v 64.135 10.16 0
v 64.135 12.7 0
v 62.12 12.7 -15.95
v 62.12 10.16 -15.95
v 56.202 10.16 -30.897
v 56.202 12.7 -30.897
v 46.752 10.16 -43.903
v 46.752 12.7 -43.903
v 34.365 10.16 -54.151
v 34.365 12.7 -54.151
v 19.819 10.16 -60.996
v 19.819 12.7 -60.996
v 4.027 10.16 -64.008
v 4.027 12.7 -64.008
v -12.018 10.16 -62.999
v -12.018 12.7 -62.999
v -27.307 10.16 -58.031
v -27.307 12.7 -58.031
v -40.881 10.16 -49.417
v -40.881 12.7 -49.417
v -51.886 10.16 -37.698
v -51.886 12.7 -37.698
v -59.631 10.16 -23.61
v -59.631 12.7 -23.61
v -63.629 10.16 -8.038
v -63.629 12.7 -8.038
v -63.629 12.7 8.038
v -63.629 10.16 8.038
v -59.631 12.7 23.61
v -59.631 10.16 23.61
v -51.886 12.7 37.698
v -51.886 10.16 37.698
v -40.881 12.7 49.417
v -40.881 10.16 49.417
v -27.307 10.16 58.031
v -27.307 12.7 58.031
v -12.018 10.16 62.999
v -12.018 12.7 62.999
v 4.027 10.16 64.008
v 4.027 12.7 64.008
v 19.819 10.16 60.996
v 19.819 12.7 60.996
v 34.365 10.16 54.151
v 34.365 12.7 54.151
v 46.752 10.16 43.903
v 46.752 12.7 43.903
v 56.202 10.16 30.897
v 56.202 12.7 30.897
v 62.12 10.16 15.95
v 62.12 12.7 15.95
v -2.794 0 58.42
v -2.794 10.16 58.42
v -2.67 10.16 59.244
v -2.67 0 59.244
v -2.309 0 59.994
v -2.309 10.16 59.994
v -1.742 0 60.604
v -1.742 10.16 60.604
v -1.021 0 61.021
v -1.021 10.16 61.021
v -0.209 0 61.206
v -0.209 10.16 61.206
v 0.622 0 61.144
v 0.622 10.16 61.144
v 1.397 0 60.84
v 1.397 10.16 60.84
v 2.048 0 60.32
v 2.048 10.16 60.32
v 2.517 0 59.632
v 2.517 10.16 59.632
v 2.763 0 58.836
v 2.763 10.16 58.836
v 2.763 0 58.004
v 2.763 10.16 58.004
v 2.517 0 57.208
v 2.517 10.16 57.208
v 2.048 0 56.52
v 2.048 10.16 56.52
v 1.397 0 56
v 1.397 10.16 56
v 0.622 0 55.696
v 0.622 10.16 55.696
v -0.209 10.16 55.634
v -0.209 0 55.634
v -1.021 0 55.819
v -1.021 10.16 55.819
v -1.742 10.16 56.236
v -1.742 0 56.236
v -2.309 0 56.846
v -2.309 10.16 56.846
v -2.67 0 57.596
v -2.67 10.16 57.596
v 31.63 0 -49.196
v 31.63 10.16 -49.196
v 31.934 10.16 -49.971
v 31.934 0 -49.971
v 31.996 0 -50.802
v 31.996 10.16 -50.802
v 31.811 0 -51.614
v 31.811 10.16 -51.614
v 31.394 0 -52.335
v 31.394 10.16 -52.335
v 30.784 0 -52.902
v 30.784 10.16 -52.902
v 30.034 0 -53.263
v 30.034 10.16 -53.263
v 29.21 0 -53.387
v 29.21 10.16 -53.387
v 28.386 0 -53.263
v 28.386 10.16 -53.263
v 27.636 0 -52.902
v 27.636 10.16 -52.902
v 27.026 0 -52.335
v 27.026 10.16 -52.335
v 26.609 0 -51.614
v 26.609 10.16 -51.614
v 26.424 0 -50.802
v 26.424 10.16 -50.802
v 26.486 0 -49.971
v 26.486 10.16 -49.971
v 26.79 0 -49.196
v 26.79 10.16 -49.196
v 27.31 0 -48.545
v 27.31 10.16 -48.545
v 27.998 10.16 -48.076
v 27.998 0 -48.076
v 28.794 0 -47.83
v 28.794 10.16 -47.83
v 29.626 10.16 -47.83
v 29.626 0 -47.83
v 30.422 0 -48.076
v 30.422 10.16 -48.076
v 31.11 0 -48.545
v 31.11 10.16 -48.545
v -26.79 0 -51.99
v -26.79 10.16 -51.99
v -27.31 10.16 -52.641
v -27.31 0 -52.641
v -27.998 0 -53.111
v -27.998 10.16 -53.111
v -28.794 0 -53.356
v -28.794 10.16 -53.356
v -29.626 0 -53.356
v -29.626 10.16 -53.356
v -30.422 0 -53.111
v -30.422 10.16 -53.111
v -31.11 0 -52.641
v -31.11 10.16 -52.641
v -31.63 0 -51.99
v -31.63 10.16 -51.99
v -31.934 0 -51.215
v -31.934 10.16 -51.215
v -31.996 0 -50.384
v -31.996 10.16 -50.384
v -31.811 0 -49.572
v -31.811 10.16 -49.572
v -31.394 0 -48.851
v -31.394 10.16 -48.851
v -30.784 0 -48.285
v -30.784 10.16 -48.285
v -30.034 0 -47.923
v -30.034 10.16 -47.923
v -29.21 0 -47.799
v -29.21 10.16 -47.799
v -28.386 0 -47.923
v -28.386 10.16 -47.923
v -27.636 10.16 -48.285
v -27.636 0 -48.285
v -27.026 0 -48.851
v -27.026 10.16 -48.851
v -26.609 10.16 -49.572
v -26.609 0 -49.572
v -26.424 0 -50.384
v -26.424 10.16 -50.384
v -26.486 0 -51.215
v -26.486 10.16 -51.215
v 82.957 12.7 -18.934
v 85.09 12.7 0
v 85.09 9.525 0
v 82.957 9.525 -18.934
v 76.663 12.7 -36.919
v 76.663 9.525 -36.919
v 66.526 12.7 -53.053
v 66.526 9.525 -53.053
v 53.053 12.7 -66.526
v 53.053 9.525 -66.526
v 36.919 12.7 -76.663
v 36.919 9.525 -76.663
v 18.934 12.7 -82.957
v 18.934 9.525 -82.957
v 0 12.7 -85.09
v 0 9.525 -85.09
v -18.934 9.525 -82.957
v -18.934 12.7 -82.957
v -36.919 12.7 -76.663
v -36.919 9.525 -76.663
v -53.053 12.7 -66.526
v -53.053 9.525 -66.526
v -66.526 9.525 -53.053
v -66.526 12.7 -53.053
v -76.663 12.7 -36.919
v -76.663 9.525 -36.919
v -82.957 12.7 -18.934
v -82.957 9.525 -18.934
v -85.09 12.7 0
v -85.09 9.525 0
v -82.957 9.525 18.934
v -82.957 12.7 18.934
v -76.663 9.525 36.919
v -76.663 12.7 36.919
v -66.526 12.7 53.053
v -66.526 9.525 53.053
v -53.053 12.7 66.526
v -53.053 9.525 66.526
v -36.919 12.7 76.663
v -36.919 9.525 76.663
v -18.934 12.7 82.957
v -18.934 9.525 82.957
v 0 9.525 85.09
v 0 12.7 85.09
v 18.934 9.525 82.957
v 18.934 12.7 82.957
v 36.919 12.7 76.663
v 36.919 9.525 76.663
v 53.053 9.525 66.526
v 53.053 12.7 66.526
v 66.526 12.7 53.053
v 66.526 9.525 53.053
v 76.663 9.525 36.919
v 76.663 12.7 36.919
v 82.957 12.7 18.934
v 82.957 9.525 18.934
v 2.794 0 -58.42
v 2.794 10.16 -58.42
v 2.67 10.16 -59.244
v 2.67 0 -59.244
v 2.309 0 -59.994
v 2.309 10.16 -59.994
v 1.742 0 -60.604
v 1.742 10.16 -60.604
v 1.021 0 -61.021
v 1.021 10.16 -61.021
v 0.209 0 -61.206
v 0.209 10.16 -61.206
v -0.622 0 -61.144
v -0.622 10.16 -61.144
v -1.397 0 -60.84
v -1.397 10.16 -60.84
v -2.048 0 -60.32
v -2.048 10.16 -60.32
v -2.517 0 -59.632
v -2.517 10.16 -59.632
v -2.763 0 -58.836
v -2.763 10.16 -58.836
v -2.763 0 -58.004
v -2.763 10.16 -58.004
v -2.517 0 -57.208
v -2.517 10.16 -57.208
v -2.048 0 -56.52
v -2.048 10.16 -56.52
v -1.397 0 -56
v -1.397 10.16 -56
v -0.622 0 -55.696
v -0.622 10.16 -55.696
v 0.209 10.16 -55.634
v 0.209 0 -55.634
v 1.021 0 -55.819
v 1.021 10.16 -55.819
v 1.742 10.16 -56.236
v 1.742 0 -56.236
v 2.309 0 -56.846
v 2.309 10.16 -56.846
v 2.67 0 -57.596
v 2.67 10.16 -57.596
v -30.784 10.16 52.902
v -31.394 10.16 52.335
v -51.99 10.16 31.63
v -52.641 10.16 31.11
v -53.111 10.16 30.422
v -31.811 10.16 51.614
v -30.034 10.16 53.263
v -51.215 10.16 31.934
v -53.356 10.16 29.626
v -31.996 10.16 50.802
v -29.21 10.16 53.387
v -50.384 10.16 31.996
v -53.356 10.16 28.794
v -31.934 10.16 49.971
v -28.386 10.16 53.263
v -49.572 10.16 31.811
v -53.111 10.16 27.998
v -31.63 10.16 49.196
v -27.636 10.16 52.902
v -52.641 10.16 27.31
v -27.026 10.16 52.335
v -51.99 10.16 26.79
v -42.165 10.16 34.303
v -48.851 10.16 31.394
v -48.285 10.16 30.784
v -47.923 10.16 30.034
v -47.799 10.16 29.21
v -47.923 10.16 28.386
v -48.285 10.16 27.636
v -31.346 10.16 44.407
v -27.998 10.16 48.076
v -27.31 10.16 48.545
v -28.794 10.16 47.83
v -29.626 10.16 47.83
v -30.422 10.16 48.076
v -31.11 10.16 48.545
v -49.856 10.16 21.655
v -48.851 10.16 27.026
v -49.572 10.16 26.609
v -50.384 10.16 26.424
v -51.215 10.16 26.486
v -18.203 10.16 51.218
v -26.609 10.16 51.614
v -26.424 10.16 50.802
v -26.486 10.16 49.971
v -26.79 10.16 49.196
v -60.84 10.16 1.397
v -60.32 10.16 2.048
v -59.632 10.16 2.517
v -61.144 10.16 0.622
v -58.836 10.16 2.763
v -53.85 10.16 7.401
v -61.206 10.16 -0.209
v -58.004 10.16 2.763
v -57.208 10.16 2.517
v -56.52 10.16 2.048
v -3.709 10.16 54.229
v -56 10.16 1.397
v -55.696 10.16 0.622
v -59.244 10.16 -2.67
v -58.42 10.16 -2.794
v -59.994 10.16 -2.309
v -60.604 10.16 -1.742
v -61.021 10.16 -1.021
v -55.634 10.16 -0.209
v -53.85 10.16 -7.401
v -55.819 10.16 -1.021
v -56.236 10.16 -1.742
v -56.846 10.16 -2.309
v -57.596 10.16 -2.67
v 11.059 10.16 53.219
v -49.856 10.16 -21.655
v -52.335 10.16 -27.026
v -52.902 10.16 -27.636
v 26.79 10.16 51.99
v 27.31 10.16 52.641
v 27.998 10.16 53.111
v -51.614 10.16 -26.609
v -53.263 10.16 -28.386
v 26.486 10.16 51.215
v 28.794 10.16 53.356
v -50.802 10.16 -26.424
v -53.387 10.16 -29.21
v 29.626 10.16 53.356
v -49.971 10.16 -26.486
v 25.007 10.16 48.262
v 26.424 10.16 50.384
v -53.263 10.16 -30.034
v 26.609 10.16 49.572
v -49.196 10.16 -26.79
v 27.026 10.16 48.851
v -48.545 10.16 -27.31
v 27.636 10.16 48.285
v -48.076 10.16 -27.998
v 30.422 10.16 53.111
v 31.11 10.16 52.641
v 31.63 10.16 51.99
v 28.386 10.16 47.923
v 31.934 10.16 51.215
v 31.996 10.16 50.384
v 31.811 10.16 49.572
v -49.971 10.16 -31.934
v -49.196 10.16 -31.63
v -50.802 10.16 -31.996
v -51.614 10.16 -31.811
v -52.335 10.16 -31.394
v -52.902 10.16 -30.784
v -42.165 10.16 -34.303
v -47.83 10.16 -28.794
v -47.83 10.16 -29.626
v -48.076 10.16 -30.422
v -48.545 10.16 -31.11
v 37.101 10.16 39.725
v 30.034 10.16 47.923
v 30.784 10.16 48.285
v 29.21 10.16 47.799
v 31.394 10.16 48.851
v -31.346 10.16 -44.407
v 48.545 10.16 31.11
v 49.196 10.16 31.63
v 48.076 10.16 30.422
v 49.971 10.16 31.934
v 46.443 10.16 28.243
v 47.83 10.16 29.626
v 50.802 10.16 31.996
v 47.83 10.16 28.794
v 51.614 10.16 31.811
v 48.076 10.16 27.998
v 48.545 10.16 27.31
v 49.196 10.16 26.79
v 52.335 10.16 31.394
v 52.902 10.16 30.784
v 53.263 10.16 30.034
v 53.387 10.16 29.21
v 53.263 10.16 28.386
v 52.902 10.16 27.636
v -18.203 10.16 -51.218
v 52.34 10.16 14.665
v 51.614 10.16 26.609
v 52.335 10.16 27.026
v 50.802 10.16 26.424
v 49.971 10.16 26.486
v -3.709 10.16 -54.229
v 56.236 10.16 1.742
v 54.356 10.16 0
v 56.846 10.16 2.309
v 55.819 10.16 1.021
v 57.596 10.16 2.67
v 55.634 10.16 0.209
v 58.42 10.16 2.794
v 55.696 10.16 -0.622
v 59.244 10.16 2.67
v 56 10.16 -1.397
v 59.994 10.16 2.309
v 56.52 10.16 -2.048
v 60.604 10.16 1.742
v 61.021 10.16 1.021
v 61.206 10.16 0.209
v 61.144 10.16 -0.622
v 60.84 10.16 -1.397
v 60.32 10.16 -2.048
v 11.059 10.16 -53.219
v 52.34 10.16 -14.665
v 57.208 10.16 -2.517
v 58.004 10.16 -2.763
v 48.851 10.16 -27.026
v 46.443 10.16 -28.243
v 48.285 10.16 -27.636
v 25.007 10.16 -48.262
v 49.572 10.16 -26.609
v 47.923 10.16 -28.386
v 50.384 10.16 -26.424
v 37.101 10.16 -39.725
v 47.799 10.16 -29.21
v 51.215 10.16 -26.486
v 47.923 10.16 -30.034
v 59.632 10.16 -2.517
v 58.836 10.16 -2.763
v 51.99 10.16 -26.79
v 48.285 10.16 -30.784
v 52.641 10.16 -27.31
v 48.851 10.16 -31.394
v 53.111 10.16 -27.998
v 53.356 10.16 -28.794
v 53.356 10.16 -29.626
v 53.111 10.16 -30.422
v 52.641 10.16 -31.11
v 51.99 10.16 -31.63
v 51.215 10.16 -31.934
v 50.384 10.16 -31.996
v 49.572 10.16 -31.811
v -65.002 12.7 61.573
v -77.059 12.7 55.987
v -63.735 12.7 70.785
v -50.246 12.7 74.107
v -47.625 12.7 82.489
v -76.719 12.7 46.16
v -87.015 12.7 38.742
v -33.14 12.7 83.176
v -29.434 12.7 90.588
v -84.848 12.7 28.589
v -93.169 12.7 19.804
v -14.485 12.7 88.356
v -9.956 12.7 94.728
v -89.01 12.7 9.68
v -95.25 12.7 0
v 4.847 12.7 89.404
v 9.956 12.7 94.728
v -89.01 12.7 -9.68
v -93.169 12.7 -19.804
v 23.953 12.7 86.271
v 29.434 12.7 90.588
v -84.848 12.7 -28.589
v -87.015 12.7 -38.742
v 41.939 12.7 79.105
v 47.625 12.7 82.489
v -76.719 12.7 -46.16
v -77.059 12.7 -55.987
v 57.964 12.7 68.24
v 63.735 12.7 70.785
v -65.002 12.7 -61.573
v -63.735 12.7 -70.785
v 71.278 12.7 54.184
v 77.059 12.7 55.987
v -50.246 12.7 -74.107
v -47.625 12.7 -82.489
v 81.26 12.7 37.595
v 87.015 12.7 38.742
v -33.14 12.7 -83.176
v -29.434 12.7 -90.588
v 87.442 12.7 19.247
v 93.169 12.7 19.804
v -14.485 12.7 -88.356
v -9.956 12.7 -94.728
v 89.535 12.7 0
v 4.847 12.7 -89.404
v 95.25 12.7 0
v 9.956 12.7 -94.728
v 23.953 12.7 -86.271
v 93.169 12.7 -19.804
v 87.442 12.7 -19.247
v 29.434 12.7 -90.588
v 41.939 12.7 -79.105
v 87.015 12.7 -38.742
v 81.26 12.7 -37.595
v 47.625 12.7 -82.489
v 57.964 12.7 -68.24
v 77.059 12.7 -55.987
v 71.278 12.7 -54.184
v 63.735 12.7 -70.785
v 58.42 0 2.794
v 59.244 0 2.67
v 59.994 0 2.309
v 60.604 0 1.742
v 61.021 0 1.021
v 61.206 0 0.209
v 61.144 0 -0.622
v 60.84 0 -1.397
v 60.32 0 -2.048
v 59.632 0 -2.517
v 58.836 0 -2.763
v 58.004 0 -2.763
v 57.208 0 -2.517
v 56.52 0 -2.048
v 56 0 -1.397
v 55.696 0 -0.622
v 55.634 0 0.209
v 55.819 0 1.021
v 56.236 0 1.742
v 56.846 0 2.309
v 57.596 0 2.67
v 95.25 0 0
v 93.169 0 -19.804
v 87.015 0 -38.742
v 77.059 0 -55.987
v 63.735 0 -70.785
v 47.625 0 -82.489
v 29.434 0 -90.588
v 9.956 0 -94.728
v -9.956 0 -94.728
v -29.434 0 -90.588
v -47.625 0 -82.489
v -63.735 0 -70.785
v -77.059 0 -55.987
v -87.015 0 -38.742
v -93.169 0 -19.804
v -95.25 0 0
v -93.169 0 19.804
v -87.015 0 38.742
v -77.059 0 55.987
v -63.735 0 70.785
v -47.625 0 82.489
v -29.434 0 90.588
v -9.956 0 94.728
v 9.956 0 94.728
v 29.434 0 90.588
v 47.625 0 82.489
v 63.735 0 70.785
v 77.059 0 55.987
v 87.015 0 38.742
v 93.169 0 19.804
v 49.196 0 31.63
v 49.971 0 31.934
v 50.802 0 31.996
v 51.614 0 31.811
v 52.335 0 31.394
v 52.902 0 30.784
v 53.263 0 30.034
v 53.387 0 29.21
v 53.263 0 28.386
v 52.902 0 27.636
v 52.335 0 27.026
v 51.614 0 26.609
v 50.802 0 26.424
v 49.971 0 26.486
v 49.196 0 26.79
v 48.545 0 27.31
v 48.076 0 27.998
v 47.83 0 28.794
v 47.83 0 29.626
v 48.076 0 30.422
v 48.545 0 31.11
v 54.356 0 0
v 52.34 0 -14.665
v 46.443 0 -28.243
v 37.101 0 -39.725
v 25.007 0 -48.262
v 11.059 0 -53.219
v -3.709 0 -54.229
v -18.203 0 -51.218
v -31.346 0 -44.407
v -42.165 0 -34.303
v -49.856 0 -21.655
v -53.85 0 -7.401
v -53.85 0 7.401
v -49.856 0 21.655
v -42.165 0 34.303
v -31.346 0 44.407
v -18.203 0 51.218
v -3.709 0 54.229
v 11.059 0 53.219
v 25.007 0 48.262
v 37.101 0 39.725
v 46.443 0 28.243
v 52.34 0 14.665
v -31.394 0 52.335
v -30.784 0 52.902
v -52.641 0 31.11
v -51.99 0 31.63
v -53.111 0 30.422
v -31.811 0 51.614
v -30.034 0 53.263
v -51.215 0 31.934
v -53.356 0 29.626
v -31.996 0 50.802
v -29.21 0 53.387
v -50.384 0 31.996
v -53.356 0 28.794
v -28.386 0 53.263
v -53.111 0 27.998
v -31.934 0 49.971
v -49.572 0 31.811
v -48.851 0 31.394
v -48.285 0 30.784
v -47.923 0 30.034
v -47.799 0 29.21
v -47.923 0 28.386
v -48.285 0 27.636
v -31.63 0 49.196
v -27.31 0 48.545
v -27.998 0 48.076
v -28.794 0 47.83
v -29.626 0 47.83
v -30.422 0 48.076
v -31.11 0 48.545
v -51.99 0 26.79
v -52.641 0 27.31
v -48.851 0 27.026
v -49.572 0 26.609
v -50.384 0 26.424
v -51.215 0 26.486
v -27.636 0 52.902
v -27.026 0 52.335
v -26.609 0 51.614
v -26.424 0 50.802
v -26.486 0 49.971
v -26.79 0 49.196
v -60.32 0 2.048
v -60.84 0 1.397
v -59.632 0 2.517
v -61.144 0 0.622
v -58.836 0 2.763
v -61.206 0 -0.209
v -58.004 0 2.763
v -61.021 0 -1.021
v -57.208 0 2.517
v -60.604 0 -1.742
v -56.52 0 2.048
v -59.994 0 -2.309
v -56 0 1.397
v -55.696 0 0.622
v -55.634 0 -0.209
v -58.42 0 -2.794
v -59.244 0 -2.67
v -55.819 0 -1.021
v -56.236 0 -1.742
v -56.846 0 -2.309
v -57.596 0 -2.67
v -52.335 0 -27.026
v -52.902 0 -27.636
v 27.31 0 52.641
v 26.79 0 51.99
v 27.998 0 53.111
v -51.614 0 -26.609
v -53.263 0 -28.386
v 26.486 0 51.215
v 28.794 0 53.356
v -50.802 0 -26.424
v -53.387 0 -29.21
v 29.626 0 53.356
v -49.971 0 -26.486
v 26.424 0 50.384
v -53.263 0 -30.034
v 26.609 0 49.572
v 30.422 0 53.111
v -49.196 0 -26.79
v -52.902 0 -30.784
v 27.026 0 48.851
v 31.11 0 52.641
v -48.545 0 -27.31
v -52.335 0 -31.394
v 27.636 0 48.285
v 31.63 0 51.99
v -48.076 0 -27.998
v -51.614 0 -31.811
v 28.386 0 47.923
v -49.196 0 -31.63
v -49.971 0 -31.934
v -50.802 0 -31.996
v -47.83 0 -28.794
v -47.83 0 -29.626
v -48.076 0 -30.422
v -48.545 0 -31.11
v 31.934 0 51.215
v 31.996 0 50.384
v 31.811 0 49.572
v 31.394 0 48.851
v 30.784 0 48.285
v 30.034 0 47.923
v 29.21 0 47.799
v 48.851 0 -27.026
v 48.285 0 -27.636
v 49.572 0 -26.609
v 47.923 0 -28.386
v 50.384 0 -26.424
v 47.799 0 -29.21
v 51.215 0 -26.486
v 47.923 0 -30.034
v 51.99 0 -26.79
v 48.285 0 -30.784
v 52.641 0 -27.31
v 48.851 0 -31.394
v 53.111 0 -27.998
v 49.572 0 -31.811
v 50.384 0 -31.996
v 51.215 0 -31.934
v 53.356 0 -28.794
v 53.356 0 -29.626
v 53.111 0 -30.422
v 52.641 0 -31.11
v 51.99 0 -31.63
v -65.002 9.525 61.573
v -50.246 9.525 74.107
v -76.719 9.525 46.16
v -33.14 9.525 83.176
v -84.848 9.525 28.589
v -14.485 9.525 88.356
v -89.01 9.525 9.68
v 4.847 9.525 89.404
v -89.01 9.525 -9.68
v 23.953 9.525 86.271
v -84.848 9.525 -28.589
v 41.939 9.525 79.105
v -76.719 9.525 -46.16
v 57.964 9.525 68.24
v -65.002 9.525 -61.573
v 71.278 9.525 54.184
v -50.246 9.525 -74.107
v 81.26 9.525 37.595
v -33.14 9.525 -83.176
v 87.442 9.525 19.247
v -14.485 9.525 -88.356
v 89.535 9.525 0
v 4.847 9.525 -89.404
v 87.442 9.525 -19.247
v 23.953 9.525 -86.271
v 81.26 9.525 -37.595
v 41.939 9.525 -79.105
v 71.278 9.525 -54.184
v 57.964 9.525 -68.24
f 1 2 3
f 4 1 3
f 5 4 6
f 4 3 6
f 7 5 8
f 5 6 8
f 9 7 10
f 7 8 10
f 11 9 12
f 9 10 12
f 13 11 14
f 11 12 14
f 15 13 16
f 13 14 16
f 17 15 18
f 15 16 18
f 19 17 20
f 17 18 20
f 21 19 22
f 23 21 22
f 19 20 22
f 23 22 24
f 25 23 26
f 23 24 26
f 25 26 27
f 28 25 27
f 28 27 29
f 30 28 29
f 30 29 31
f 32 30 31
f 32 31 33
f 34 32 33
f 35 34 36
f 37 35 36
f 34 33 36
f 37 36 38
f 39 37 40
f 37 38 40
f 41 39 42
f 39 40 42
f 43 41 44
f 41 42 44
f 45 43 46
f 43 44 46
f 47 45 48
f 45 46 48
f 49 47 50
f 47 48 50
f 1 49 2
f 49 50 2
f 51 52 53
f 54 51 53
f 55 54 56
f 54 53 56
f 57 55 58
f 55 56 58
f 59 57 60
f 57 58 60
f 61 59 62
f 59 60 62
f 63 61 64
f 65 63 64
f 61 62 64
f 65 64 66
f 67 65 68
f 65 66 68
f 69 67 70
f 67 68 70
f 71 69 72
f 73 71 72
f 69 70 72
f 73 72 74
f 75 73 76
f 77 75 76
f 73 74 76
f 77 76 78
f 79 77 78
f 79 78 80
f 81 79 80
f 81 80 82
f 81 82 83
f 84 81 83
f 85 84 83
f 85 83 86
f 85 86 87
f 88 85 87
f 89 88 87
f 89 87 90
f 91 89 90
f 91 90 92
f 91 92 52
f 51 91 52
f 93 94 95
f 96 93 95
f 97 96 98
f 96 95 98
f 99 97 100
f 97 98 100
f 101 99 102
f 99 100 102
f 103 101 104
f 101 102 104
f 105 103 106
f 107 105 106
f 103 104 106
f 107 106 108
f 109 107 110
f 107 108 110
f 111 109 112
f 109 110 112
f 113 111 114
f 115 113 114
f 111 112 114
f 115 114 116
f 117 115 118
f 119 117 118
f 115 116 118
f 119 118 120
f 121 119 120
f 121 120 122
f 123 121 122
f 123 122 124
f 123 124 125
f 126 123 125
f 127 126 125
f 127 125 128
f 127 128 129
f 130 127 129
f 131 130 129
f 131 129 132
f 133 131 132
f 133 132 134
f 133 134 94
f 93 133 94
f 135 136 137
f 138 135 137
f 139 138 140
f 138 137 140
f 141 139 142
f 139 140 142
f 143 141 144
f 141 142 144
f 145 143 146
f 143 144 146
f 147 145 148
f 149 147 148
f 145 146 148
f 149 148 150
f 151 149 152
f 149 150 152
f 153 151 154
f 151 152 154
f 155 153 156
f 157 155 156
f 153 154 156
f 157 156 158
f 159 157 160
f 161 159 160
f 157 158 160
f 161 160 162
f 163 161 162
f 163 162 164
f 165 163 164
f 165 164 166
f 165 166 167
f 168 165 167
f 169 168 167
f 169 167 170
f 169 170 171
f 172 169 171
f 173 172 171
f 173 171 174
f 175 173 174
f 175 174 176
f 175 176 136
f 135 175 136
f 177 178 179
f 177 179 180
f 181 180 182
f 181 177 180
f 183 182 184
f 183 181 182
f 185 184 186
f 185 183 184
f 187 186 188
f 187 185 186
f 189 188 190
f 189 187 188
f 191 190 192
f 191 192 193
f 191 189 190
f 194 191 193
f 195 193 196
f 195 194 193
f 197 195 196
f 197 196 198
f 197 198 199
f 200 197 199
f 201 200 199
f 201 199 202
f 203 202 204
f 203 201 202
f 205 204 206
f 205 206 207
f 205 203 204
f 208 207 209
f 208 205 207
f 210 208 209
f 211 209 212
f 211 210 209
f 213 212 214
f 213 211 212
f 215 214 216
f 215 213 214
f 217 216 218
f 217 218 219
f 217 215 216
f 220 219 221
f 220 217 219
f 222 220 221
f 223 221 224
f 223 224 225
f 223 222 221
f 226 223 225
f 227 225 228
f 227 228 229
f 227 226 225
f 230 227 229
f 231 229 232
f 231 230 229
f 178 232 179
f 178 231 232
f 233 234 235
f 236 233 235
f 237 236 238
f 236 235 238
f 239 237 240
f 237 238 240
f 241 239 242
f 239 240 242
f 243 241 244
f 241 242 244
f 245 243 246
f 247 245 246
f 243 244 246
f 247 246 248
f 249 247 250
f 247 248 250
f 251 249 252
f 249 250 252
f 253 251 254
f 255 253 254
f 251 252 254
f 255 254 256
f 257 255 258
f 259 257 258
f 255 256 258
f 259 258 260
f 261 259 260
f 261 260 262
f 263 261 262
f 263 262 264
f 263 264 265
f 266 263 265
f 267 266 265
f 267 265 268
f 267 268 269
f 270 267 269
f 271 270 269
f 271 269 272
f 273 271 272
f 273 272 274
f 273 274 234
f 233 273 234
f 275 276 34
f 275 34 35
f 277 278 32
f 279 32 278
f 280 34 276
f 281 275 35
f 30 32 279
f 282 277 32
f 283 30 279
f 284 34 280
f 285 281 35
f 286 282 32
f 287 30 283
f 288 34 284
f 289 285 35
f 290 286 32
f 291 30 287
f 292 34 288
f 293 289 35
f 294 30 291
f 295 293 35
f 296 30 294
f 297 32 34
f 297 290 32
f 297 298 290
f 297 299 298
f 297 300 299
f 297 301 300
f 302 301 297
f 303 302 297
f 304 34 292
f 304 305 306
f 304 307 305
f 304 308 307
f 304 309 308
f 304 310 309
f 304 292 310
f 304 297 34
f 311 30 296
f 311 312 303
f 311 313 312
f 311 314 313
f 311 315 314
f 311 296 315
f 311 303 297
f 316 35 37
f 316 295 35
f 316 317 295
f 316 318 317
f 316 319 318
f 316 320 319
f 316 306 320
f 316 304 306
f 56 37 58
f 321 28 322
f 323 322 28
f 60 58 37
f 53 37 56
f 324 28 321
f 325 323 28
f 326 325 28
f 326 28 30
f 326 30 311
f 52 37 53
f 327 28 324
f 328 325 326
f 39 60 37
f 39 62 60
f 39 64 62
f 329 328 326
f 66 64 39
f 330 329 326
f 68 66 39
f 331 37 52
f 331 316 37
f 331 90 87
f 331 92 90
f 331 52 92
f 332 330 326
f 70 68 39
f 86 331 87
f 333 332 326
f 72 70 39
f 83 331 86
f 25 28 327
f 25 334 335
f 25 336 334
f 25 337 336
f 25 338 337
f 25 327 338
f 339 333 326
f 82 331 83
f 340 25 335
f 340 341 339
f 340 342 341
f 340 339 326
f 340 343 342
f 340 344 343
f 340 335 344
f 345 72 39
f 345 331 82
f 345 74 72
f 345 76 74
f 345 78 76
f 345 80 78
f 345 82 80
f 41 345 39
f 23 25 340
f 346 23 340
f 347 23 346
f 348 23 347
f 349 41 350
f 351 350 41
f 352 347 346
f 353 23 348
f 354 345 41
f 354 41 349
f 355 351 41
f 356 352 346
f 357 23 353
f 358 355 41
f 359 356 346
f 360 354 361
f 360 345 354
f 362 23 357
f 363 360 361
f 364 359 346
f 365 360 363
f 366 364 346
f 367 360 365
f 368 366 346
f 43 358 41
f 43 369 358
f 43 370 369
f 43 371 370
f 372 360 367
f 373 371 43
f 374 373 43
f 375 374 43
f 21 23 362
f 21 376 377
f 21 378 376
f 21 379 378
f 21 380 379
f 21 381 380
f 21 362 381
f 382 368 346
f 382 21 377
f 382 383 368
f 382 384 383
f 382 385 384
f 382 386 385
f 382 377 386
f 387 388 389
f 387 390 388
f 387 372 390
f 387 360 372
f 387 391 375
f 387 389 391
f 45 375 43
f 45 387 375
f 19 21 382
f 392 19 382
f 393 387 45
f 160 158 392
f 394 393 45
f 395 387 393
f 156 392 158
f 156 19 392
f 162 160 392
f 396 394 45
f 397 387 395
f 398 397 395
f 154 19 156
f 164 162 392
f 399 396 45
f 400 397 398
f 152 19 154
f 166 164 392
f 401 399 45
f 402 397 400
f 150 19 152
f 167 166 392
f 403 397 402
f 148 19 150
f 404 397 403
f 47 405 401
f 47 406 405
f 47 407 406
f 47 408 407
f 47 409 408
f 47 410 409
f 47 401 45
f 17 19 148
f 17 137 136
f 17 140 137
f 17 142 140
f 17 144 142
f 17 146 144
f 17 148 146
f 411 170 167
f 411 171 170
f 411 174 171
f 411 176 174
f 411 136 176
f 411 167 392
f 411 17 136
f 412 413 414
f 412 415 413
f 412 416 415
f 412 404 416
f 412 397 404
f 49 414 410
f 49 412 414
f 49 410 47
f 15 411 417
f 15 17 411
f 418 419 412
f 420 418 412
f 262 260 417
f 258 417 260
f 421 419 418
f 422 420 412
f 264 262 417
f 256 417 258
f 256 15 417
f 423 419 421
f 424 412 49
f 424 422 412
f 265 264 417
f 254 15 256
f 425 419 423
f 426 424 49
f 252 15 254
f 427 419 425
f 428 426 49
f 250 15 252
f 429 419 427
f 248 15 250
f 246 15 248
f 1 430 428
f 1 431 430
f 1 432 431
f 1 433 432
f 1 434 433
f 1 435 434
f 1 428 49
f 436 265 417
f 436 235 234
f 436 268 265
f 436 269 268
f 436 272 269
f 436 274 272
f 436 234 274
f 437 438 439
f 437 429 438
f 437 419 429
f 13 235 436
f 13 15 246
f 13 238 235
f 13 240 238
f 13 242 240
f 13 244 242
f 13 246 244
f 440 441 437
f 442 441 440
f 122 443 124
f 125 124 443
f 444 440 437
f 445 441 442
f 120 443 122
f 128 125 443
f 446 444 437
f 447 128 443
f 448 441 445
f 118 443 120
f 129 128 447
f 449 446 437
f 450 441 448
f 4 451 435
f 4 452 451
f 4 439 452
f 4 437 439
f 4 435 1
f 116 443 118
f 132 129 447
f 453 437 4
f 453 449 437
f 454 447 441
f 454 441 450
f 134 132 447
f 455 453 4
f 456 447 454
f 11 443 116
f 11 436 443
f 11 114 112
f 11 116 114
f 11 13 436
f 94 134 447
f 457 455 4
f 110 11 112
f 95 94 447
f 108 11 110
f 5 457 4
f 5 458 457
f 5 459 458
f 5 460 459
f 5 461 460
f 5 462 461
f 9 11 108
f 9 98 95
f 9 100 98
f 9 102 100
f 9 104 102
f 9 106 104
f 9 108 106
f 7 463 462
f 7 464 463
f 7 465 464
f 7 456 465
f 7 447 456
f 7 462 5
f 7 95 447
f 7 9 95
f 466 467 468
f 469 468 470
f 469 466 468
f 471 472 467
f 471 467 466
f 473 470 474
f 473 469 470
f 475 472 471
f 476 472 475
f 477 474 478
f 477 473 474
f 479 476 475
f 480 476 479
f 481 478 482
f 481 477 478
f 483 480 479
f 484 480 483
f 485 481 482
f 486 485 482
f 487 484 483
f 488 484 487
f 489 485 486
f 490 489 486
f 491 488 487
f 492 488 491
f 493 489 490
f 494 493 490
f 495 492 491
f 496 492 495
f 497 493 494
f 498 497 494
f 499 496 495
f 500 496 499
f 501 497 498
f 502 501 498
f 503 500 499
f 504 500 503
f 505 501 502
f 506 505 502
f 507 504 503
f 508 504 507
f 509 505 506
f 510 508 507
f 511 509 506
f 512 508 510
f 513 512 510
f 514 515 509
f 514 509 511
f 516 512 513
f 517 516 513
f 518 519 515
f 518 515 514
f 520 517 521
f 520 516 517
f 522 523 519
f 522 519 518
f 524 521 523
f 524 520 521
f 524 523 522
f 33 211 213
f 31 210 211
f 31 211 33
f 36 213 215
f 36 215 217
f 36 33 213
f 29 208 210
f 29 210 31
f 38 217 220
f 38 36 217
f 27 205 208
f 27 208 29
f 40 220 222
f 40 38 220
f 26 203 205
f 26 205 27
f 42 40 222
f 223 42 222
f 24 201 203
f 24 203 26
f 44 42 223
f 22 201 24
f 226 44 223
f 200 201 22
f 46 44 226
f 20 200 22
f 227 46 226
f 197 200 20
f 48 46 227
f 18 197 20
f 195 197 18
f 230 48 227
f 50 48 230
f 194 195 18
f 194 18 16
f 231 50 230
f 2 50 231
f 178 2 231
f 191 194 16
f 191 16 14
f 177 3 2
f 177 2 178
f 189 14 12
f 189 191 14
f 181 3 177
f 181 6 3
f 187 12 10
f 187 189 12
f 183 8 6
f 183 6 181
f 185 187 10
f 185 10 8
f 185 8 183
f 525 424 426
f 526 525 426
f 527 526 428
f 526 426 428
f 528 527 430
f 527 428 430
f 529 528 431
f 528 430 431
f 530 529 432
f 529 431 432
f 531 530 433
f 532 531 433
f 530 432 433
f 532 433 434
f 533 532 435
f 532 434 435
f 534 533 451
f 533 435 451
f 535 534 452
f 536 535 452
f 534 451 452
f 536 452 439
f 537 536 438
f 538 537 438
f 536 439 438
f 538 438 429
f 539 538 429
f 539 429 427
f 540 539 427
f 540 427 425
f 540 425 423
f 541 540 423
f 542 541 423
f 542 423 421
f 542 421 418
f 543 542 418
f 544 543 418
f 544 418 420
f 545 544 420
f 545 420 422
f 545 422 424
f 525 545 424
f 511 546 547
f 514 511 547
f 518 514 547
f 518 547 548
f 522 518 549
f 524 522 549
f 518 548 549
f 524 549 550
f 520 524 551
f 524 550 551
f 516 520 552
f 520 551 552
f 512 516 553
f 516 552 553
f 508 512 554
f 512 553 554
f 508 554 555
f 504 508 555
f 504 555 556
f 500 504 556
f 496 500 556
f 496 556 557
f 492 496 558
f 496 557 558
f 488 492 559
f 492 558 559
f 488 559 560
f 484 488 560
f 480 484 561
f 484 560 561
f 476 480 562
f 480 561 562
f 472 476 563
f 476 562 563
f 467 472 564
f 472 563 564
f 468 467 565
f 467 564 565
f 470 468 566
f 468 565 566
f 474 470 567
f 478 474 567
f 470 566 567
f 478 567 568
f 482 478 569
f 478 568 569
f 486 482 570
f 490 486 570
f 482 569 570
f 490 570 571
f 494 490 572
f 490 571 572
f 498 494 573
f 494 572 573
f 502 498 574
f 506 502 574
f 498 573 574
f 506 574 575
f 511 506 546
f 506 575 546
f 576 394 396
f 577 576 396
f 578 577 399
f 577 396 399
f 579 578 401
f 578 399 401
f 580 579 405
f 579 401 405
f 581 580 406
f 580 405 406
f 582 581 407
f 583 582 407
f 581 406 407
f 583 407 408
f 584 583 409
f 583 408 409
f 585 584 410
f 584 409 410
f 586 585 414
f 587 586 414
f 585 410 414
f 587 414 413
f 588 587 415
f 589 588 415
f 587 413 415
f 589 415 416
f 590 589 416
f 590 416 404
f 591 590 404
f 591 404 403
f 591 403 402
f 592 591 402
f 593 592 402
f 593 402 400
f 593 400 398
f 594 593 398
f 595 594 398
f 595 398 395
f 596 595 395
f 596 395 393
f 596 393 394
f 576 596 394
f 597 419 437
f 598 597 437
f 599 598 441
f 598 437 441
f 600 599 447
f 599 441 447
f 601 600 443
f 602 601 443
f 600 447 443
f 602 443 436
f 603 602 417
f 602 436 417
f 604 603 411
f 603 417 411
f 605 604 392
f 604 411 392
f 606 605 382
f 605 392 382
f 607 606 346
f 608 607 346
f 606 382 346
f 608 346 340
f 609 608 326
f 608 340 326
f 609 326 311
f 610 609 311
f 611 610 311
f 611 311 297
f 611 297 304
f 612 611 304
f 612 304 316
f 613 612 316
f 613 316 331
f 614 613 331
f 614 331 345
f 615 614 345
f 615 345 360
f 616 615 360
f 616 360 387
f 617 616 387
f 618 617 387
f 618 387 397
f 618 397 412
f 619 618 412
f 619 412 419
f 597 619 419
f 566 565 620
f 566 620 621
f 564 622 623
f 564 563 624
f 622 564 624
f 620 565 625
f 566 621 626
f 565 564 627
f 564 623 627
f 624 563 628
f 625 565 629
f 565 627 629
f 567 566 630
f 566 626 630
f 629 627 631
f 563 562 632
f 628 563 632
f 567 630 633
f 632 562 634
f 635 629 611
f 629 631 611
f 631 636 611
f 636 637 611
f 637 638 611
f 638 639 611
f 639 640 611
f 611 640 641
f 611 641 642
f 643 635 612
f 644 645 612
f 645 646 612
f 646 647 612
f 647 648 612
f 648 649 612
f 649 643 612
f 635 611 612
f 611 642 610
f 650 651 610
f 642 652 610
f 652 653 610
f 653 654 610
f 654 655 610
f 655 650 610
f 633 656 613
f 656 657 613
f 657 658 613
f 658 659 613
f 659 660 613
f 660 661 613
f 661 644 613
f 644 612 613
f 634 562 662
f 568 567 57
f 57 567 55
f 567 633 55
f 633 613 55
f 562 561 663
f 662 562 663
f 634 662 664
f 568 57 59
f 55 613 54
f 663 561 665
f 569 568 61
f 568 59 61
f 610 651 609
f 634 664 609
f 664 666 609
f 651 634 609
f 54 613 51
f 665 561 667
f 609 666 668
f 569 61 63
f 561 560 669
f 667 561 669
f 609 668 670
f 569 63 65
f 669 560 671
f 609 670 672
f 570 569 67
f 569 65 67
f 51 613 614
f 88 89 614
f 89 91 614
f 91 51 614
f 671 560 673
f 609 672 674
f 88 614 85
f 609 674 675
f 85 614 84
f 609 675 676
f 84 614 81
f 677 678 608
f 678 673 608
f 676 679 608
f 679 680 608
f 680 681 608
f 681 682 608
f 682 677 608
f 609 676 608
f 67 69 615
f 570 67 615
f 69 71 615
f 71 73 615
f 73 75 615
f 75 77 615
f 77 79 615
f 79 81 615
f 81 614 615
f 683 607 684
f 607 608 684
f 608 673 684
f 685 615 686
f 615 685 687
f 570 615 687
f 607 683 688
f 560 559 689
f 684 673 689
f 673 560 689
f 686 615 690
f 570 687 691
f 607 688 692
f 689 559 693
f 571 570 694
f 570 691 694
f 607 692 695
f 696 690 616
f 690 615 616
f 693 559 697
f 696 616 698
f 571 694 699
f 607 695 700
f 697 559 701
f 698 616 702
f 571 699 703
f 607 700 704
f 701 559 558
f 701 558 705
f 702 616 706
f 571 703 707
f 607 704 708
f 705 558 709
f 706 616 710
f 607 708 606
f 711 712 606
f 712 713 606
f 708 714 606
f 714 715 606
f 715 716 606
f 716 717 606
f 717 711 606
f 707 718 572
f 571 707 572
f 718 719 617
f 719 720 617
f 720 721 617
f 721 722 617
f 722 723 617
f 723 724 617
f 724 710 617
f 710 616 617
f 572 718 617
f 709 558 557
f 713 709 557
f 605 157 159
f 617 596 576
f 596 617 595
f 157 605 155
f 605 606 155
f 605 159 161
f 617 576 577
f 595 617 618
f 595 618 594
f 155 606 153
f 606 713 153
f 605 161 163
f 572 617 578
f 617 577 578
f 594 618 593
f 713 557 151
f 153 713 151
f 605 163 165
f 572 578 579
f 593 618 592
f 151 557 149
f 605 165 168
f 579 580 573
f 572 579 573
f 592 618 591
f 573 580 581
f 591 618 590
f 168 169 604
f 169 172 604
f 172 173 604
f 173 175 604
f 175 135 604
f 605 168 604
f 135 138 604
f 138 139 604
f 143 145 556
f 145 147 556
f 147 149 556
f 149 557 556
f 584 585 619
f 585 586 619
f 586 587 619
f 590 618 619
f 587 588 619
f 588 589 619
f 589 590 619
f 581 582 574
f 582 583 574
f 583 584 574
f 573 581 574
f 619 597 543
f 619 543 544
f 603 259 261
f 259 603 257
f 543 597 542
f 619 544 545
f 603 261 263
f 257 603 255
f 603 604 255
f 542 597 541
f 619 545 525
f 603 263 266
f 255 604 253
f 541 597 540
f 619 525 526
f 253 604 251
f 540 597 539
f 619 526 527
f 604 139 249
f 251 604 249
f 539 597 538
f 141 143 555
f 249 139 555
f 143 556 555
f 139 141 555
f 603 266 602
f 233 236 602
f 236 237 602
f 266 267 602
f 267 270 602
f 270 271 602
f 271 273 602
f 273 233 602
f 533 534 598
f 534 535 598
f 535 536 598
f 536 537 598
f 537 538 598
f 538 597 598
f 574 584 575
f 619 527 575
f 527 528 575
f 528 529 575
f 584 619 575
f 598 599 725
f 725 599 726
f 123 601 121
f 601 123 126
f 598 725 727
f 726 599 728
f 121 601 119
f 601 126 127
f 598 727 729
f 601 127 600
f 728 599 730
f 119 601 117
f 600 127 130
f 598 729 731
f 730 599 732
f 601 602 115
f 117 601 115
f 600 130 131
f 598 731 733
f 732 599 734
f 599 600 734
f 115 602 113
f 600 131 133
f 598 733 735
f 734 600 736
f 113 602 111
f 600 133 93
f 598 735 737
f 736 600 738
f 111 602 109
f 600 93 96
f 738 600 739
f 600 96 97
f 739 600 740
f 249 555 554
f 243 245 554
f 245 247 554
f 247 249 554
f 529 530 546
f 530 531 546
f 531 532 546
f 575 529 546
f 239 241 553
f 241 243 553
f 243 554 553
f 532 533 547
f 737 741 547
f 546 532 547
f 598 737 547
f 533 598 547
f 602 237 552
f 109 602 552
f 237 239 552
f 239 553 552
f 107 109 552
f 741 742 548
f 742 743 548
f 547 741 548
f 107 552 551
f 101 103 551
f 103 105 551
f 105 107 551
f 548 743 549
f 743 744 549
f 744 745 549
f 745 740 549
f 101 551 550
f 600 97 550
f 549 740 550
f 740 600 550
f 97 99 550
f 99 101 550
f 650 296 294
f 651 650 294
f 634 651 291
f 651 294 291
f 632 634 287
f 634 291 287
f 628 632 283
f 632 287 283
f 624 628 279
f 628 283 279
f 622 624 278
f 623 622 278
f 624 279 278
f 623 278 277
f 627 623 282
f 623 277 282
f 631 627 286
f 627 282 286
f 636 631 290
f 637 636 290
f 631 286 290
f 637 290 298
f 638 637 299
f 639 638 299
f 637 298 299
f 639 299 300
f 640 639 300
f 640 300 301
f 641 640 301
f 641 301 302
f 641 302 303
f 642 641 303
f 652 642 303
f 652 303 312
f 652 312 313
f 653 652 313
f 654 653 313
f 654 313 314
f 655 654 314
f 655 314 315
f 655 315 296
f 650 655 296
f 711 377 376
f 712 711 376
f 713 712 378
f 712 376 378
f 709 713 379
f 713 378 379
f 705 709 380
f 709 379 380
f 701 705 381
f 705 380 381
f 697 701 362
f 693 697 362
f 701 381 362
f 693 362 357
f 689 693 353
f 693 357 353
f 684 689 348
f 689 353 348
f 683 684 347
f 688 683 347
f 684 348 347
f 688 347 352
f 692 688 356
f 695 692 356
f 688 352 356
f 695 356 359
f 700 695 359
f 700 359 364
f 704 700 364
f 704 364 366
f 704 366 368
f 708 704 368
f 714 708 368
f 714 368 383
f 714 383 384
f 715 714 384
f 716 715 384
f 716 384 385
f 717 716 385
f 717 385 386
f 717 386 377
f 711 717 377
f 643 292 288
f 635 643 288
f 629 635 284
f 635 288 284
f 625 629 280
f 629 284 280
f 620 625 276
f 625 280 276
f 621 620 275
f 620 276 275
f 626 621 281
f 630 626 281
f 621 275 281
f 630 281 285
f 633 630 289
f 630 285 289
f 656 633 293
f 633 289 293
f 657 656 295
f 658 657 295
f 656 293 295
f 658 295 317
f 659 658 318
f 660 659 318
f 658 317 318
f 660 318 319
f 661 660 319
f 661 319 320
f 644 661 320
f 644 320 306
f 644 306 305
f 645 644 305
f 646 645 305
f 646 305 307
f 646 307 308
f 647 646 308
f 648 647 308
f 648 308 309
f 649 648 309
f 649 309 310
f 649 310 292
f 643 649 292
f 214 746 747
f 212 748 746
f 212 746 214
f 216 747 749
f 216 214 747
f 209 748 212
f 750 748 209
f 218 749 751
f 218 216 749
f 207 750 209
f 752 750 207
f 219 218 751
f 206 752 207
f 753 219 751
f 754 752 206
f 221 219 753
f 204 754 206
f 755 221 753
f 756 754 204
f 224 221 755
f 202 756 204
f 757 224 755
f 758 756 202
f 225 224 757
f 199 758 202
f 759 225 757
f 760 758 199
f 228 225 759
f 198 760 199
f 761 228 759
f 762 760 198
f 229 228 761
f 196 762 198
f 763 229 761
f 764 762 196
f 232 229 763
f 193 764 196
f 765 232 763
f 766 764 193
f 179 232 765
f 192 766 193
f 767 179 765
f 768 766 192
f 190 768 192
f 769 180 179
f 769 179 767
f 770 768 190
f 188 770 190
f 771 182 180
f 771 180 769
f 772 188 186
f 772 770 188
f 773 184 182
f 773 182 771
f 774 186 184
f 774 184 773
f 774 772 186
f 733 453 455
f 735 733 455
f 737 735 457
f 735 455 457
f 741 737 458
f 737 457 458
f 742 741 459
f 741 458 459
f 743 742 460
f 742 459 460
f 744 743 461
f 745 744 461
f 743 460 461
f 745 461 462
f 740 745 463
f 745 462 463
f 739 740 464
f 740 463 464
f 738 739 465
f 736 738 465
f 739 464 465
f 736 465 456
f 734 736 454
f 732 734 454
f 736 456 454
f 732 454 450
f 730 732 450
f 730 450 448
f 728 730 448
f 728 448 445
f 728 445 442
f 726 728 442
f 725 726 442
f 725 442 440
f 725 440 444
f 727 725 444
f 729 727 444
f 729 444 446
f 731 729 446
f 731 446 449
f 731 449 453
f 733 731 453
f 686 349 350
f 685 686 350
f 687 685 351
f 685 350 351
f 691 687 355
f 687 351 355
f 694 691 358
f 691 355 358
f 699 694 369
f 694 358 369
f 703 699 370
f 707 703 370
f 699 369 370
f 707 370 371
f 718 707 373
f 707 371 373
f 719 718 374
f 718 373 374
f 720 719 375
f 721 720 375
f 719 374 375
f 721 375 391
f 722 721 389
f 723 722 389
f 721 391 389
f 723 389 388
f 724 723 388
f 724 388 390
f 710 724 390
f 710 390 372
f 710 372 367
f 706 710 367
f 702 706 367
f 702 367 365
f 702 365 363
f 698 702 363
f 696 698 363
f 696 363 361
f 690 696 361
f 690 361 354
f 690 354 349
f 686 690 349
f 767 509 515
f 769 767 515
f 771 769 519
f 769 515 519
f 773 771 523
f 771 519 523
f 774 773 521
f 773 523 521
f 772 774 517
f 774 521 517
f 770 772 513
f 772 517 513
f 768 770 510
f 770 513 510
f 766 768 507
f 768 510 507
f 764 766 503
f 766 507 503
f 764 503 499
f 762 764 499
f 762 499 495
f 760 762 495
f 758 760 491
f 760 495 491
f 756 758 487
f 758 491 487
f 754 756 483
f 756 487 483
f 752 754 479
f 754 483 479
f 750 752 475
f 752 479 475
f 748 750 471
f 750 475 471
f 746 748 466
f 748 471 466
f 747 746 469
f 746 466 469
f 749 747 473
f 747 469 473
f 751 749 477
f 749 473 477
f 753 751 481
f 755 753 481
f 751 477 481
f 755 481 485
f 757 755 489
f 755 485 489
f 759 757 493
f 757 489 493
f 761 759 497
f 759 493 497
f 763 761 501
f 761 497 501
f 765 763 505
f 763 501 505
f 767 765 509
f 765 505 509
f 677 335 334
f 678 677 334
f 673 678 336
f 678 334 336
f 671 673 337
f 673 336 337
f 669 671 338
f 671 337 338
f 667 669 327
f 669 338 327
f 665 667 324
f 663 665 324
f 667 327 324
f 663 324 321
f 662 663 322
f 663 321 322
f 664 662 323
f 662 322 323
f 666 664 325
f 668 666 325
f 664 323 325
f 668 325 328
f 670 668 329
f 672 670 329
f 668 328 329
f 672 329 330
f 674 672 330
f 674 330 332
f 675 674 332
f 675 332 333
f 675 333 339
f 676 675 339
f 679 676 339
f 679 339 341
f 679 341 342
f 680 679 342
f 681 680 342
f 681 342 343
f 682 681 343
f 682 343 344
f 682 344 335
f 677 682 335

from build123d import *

# Parameters (mm, degrees)
SKETCH1_R           = 95.25
BOSS_EXTRUDE1_DEPTH = 12.7
SKETCH2_R           = 54.356
CUT_EXTRUDE1_DEPTH  = 13.7
SKETCH3_R           = 64.135
CUT_EXTRUDE2_DEPTH  = 2.54
SKETCH4_R           = 2.794
CUT_EXTRUDE3_DEPTH  = 13.7
CIRPATTERN1_COUNT   = 12
SKETCH5_R           = 89.535
SKETCH5_R_2         = 85.09
CUT_EXTRUDE4_DEPTH  = 3.175


with BuildPart() as part:
    # Sketch1 → Boss-Extrude1 (new body)
    with BuildSketch(Plane(origin=(0, 0, 0), x_dir=(1, 0, 0), z_dir=(0, 1, 0))):
        Circle(SKETCH1_R)
    extrude(amount=BOSS_EXTRUDE1_DEPTH)

    # Sketch2 → Cut-Extrude1 (cut, through all)
    with BuildSketch(Plane(origin=(0, 12.7, 0), x_dir=(1, 0, 0), z_dir=(0, 1, 0))):
        Circle(SKETCH2_R)
    extrude(amount=-CUT_EXTRUDE1_DEPTH, mode=Mode.SUBTRACT)

    # Sketch3 → Cut-Extrude2 (cut)
    with BuildSketch(Plane(origin=(0, 12.7, 0), x_dir=(1, 0, 0), z_dir=(0, 1, 0))):
        Circle(SKETCH3_R)
    extrude(amount=-CUT_EXTRUDE2_DEPTH, mode=Mode.SUBTRACT)

    # Sketch4 → Cut-Extrude3 (cut, through all)
    with BuildSketch(Plane(origin=(0, 12.7, 0), x_dir=(1, 0, 0), z_dir=(0, 1, 0))):
        with Locations((0, 58.42)):
            Circle(SKETCH4_R)
    cut_extrude3 = extrude(amount=-CUT_EXTRUDE3_DEPTH, mode=Mode.SUBTRACT)

    # CirPattern1: Cut-Extrude3 ×12 about axis
    cirpattern1_axis = Axis((0, 0, 0), (0, 1, 0))
    for i in range(1, CIRPATTERN1_COUNT):
        add(cut_extrude3.rotate(cirpattern1_axis, i * 360 / CIRPATTERN1_COUNT), mode=Mode.SUBTRACT)

    # Sketch5 → Cut-Extrude4 (cut)
    with BuildSketch(Plane(origin=(0, 12.7, 0), x_dir=(1, 0, 0), z_dir=(0, 1, 0))):
        Circle(SKETCH5_R)
        Circle(SKETCH5_R_2, mode=Mode.SUBTRACT)
    extrude(amount=-CUT_EXTRUDE4_DEPTH, mode=Mode.SUBTRACT)


solid = part.part
